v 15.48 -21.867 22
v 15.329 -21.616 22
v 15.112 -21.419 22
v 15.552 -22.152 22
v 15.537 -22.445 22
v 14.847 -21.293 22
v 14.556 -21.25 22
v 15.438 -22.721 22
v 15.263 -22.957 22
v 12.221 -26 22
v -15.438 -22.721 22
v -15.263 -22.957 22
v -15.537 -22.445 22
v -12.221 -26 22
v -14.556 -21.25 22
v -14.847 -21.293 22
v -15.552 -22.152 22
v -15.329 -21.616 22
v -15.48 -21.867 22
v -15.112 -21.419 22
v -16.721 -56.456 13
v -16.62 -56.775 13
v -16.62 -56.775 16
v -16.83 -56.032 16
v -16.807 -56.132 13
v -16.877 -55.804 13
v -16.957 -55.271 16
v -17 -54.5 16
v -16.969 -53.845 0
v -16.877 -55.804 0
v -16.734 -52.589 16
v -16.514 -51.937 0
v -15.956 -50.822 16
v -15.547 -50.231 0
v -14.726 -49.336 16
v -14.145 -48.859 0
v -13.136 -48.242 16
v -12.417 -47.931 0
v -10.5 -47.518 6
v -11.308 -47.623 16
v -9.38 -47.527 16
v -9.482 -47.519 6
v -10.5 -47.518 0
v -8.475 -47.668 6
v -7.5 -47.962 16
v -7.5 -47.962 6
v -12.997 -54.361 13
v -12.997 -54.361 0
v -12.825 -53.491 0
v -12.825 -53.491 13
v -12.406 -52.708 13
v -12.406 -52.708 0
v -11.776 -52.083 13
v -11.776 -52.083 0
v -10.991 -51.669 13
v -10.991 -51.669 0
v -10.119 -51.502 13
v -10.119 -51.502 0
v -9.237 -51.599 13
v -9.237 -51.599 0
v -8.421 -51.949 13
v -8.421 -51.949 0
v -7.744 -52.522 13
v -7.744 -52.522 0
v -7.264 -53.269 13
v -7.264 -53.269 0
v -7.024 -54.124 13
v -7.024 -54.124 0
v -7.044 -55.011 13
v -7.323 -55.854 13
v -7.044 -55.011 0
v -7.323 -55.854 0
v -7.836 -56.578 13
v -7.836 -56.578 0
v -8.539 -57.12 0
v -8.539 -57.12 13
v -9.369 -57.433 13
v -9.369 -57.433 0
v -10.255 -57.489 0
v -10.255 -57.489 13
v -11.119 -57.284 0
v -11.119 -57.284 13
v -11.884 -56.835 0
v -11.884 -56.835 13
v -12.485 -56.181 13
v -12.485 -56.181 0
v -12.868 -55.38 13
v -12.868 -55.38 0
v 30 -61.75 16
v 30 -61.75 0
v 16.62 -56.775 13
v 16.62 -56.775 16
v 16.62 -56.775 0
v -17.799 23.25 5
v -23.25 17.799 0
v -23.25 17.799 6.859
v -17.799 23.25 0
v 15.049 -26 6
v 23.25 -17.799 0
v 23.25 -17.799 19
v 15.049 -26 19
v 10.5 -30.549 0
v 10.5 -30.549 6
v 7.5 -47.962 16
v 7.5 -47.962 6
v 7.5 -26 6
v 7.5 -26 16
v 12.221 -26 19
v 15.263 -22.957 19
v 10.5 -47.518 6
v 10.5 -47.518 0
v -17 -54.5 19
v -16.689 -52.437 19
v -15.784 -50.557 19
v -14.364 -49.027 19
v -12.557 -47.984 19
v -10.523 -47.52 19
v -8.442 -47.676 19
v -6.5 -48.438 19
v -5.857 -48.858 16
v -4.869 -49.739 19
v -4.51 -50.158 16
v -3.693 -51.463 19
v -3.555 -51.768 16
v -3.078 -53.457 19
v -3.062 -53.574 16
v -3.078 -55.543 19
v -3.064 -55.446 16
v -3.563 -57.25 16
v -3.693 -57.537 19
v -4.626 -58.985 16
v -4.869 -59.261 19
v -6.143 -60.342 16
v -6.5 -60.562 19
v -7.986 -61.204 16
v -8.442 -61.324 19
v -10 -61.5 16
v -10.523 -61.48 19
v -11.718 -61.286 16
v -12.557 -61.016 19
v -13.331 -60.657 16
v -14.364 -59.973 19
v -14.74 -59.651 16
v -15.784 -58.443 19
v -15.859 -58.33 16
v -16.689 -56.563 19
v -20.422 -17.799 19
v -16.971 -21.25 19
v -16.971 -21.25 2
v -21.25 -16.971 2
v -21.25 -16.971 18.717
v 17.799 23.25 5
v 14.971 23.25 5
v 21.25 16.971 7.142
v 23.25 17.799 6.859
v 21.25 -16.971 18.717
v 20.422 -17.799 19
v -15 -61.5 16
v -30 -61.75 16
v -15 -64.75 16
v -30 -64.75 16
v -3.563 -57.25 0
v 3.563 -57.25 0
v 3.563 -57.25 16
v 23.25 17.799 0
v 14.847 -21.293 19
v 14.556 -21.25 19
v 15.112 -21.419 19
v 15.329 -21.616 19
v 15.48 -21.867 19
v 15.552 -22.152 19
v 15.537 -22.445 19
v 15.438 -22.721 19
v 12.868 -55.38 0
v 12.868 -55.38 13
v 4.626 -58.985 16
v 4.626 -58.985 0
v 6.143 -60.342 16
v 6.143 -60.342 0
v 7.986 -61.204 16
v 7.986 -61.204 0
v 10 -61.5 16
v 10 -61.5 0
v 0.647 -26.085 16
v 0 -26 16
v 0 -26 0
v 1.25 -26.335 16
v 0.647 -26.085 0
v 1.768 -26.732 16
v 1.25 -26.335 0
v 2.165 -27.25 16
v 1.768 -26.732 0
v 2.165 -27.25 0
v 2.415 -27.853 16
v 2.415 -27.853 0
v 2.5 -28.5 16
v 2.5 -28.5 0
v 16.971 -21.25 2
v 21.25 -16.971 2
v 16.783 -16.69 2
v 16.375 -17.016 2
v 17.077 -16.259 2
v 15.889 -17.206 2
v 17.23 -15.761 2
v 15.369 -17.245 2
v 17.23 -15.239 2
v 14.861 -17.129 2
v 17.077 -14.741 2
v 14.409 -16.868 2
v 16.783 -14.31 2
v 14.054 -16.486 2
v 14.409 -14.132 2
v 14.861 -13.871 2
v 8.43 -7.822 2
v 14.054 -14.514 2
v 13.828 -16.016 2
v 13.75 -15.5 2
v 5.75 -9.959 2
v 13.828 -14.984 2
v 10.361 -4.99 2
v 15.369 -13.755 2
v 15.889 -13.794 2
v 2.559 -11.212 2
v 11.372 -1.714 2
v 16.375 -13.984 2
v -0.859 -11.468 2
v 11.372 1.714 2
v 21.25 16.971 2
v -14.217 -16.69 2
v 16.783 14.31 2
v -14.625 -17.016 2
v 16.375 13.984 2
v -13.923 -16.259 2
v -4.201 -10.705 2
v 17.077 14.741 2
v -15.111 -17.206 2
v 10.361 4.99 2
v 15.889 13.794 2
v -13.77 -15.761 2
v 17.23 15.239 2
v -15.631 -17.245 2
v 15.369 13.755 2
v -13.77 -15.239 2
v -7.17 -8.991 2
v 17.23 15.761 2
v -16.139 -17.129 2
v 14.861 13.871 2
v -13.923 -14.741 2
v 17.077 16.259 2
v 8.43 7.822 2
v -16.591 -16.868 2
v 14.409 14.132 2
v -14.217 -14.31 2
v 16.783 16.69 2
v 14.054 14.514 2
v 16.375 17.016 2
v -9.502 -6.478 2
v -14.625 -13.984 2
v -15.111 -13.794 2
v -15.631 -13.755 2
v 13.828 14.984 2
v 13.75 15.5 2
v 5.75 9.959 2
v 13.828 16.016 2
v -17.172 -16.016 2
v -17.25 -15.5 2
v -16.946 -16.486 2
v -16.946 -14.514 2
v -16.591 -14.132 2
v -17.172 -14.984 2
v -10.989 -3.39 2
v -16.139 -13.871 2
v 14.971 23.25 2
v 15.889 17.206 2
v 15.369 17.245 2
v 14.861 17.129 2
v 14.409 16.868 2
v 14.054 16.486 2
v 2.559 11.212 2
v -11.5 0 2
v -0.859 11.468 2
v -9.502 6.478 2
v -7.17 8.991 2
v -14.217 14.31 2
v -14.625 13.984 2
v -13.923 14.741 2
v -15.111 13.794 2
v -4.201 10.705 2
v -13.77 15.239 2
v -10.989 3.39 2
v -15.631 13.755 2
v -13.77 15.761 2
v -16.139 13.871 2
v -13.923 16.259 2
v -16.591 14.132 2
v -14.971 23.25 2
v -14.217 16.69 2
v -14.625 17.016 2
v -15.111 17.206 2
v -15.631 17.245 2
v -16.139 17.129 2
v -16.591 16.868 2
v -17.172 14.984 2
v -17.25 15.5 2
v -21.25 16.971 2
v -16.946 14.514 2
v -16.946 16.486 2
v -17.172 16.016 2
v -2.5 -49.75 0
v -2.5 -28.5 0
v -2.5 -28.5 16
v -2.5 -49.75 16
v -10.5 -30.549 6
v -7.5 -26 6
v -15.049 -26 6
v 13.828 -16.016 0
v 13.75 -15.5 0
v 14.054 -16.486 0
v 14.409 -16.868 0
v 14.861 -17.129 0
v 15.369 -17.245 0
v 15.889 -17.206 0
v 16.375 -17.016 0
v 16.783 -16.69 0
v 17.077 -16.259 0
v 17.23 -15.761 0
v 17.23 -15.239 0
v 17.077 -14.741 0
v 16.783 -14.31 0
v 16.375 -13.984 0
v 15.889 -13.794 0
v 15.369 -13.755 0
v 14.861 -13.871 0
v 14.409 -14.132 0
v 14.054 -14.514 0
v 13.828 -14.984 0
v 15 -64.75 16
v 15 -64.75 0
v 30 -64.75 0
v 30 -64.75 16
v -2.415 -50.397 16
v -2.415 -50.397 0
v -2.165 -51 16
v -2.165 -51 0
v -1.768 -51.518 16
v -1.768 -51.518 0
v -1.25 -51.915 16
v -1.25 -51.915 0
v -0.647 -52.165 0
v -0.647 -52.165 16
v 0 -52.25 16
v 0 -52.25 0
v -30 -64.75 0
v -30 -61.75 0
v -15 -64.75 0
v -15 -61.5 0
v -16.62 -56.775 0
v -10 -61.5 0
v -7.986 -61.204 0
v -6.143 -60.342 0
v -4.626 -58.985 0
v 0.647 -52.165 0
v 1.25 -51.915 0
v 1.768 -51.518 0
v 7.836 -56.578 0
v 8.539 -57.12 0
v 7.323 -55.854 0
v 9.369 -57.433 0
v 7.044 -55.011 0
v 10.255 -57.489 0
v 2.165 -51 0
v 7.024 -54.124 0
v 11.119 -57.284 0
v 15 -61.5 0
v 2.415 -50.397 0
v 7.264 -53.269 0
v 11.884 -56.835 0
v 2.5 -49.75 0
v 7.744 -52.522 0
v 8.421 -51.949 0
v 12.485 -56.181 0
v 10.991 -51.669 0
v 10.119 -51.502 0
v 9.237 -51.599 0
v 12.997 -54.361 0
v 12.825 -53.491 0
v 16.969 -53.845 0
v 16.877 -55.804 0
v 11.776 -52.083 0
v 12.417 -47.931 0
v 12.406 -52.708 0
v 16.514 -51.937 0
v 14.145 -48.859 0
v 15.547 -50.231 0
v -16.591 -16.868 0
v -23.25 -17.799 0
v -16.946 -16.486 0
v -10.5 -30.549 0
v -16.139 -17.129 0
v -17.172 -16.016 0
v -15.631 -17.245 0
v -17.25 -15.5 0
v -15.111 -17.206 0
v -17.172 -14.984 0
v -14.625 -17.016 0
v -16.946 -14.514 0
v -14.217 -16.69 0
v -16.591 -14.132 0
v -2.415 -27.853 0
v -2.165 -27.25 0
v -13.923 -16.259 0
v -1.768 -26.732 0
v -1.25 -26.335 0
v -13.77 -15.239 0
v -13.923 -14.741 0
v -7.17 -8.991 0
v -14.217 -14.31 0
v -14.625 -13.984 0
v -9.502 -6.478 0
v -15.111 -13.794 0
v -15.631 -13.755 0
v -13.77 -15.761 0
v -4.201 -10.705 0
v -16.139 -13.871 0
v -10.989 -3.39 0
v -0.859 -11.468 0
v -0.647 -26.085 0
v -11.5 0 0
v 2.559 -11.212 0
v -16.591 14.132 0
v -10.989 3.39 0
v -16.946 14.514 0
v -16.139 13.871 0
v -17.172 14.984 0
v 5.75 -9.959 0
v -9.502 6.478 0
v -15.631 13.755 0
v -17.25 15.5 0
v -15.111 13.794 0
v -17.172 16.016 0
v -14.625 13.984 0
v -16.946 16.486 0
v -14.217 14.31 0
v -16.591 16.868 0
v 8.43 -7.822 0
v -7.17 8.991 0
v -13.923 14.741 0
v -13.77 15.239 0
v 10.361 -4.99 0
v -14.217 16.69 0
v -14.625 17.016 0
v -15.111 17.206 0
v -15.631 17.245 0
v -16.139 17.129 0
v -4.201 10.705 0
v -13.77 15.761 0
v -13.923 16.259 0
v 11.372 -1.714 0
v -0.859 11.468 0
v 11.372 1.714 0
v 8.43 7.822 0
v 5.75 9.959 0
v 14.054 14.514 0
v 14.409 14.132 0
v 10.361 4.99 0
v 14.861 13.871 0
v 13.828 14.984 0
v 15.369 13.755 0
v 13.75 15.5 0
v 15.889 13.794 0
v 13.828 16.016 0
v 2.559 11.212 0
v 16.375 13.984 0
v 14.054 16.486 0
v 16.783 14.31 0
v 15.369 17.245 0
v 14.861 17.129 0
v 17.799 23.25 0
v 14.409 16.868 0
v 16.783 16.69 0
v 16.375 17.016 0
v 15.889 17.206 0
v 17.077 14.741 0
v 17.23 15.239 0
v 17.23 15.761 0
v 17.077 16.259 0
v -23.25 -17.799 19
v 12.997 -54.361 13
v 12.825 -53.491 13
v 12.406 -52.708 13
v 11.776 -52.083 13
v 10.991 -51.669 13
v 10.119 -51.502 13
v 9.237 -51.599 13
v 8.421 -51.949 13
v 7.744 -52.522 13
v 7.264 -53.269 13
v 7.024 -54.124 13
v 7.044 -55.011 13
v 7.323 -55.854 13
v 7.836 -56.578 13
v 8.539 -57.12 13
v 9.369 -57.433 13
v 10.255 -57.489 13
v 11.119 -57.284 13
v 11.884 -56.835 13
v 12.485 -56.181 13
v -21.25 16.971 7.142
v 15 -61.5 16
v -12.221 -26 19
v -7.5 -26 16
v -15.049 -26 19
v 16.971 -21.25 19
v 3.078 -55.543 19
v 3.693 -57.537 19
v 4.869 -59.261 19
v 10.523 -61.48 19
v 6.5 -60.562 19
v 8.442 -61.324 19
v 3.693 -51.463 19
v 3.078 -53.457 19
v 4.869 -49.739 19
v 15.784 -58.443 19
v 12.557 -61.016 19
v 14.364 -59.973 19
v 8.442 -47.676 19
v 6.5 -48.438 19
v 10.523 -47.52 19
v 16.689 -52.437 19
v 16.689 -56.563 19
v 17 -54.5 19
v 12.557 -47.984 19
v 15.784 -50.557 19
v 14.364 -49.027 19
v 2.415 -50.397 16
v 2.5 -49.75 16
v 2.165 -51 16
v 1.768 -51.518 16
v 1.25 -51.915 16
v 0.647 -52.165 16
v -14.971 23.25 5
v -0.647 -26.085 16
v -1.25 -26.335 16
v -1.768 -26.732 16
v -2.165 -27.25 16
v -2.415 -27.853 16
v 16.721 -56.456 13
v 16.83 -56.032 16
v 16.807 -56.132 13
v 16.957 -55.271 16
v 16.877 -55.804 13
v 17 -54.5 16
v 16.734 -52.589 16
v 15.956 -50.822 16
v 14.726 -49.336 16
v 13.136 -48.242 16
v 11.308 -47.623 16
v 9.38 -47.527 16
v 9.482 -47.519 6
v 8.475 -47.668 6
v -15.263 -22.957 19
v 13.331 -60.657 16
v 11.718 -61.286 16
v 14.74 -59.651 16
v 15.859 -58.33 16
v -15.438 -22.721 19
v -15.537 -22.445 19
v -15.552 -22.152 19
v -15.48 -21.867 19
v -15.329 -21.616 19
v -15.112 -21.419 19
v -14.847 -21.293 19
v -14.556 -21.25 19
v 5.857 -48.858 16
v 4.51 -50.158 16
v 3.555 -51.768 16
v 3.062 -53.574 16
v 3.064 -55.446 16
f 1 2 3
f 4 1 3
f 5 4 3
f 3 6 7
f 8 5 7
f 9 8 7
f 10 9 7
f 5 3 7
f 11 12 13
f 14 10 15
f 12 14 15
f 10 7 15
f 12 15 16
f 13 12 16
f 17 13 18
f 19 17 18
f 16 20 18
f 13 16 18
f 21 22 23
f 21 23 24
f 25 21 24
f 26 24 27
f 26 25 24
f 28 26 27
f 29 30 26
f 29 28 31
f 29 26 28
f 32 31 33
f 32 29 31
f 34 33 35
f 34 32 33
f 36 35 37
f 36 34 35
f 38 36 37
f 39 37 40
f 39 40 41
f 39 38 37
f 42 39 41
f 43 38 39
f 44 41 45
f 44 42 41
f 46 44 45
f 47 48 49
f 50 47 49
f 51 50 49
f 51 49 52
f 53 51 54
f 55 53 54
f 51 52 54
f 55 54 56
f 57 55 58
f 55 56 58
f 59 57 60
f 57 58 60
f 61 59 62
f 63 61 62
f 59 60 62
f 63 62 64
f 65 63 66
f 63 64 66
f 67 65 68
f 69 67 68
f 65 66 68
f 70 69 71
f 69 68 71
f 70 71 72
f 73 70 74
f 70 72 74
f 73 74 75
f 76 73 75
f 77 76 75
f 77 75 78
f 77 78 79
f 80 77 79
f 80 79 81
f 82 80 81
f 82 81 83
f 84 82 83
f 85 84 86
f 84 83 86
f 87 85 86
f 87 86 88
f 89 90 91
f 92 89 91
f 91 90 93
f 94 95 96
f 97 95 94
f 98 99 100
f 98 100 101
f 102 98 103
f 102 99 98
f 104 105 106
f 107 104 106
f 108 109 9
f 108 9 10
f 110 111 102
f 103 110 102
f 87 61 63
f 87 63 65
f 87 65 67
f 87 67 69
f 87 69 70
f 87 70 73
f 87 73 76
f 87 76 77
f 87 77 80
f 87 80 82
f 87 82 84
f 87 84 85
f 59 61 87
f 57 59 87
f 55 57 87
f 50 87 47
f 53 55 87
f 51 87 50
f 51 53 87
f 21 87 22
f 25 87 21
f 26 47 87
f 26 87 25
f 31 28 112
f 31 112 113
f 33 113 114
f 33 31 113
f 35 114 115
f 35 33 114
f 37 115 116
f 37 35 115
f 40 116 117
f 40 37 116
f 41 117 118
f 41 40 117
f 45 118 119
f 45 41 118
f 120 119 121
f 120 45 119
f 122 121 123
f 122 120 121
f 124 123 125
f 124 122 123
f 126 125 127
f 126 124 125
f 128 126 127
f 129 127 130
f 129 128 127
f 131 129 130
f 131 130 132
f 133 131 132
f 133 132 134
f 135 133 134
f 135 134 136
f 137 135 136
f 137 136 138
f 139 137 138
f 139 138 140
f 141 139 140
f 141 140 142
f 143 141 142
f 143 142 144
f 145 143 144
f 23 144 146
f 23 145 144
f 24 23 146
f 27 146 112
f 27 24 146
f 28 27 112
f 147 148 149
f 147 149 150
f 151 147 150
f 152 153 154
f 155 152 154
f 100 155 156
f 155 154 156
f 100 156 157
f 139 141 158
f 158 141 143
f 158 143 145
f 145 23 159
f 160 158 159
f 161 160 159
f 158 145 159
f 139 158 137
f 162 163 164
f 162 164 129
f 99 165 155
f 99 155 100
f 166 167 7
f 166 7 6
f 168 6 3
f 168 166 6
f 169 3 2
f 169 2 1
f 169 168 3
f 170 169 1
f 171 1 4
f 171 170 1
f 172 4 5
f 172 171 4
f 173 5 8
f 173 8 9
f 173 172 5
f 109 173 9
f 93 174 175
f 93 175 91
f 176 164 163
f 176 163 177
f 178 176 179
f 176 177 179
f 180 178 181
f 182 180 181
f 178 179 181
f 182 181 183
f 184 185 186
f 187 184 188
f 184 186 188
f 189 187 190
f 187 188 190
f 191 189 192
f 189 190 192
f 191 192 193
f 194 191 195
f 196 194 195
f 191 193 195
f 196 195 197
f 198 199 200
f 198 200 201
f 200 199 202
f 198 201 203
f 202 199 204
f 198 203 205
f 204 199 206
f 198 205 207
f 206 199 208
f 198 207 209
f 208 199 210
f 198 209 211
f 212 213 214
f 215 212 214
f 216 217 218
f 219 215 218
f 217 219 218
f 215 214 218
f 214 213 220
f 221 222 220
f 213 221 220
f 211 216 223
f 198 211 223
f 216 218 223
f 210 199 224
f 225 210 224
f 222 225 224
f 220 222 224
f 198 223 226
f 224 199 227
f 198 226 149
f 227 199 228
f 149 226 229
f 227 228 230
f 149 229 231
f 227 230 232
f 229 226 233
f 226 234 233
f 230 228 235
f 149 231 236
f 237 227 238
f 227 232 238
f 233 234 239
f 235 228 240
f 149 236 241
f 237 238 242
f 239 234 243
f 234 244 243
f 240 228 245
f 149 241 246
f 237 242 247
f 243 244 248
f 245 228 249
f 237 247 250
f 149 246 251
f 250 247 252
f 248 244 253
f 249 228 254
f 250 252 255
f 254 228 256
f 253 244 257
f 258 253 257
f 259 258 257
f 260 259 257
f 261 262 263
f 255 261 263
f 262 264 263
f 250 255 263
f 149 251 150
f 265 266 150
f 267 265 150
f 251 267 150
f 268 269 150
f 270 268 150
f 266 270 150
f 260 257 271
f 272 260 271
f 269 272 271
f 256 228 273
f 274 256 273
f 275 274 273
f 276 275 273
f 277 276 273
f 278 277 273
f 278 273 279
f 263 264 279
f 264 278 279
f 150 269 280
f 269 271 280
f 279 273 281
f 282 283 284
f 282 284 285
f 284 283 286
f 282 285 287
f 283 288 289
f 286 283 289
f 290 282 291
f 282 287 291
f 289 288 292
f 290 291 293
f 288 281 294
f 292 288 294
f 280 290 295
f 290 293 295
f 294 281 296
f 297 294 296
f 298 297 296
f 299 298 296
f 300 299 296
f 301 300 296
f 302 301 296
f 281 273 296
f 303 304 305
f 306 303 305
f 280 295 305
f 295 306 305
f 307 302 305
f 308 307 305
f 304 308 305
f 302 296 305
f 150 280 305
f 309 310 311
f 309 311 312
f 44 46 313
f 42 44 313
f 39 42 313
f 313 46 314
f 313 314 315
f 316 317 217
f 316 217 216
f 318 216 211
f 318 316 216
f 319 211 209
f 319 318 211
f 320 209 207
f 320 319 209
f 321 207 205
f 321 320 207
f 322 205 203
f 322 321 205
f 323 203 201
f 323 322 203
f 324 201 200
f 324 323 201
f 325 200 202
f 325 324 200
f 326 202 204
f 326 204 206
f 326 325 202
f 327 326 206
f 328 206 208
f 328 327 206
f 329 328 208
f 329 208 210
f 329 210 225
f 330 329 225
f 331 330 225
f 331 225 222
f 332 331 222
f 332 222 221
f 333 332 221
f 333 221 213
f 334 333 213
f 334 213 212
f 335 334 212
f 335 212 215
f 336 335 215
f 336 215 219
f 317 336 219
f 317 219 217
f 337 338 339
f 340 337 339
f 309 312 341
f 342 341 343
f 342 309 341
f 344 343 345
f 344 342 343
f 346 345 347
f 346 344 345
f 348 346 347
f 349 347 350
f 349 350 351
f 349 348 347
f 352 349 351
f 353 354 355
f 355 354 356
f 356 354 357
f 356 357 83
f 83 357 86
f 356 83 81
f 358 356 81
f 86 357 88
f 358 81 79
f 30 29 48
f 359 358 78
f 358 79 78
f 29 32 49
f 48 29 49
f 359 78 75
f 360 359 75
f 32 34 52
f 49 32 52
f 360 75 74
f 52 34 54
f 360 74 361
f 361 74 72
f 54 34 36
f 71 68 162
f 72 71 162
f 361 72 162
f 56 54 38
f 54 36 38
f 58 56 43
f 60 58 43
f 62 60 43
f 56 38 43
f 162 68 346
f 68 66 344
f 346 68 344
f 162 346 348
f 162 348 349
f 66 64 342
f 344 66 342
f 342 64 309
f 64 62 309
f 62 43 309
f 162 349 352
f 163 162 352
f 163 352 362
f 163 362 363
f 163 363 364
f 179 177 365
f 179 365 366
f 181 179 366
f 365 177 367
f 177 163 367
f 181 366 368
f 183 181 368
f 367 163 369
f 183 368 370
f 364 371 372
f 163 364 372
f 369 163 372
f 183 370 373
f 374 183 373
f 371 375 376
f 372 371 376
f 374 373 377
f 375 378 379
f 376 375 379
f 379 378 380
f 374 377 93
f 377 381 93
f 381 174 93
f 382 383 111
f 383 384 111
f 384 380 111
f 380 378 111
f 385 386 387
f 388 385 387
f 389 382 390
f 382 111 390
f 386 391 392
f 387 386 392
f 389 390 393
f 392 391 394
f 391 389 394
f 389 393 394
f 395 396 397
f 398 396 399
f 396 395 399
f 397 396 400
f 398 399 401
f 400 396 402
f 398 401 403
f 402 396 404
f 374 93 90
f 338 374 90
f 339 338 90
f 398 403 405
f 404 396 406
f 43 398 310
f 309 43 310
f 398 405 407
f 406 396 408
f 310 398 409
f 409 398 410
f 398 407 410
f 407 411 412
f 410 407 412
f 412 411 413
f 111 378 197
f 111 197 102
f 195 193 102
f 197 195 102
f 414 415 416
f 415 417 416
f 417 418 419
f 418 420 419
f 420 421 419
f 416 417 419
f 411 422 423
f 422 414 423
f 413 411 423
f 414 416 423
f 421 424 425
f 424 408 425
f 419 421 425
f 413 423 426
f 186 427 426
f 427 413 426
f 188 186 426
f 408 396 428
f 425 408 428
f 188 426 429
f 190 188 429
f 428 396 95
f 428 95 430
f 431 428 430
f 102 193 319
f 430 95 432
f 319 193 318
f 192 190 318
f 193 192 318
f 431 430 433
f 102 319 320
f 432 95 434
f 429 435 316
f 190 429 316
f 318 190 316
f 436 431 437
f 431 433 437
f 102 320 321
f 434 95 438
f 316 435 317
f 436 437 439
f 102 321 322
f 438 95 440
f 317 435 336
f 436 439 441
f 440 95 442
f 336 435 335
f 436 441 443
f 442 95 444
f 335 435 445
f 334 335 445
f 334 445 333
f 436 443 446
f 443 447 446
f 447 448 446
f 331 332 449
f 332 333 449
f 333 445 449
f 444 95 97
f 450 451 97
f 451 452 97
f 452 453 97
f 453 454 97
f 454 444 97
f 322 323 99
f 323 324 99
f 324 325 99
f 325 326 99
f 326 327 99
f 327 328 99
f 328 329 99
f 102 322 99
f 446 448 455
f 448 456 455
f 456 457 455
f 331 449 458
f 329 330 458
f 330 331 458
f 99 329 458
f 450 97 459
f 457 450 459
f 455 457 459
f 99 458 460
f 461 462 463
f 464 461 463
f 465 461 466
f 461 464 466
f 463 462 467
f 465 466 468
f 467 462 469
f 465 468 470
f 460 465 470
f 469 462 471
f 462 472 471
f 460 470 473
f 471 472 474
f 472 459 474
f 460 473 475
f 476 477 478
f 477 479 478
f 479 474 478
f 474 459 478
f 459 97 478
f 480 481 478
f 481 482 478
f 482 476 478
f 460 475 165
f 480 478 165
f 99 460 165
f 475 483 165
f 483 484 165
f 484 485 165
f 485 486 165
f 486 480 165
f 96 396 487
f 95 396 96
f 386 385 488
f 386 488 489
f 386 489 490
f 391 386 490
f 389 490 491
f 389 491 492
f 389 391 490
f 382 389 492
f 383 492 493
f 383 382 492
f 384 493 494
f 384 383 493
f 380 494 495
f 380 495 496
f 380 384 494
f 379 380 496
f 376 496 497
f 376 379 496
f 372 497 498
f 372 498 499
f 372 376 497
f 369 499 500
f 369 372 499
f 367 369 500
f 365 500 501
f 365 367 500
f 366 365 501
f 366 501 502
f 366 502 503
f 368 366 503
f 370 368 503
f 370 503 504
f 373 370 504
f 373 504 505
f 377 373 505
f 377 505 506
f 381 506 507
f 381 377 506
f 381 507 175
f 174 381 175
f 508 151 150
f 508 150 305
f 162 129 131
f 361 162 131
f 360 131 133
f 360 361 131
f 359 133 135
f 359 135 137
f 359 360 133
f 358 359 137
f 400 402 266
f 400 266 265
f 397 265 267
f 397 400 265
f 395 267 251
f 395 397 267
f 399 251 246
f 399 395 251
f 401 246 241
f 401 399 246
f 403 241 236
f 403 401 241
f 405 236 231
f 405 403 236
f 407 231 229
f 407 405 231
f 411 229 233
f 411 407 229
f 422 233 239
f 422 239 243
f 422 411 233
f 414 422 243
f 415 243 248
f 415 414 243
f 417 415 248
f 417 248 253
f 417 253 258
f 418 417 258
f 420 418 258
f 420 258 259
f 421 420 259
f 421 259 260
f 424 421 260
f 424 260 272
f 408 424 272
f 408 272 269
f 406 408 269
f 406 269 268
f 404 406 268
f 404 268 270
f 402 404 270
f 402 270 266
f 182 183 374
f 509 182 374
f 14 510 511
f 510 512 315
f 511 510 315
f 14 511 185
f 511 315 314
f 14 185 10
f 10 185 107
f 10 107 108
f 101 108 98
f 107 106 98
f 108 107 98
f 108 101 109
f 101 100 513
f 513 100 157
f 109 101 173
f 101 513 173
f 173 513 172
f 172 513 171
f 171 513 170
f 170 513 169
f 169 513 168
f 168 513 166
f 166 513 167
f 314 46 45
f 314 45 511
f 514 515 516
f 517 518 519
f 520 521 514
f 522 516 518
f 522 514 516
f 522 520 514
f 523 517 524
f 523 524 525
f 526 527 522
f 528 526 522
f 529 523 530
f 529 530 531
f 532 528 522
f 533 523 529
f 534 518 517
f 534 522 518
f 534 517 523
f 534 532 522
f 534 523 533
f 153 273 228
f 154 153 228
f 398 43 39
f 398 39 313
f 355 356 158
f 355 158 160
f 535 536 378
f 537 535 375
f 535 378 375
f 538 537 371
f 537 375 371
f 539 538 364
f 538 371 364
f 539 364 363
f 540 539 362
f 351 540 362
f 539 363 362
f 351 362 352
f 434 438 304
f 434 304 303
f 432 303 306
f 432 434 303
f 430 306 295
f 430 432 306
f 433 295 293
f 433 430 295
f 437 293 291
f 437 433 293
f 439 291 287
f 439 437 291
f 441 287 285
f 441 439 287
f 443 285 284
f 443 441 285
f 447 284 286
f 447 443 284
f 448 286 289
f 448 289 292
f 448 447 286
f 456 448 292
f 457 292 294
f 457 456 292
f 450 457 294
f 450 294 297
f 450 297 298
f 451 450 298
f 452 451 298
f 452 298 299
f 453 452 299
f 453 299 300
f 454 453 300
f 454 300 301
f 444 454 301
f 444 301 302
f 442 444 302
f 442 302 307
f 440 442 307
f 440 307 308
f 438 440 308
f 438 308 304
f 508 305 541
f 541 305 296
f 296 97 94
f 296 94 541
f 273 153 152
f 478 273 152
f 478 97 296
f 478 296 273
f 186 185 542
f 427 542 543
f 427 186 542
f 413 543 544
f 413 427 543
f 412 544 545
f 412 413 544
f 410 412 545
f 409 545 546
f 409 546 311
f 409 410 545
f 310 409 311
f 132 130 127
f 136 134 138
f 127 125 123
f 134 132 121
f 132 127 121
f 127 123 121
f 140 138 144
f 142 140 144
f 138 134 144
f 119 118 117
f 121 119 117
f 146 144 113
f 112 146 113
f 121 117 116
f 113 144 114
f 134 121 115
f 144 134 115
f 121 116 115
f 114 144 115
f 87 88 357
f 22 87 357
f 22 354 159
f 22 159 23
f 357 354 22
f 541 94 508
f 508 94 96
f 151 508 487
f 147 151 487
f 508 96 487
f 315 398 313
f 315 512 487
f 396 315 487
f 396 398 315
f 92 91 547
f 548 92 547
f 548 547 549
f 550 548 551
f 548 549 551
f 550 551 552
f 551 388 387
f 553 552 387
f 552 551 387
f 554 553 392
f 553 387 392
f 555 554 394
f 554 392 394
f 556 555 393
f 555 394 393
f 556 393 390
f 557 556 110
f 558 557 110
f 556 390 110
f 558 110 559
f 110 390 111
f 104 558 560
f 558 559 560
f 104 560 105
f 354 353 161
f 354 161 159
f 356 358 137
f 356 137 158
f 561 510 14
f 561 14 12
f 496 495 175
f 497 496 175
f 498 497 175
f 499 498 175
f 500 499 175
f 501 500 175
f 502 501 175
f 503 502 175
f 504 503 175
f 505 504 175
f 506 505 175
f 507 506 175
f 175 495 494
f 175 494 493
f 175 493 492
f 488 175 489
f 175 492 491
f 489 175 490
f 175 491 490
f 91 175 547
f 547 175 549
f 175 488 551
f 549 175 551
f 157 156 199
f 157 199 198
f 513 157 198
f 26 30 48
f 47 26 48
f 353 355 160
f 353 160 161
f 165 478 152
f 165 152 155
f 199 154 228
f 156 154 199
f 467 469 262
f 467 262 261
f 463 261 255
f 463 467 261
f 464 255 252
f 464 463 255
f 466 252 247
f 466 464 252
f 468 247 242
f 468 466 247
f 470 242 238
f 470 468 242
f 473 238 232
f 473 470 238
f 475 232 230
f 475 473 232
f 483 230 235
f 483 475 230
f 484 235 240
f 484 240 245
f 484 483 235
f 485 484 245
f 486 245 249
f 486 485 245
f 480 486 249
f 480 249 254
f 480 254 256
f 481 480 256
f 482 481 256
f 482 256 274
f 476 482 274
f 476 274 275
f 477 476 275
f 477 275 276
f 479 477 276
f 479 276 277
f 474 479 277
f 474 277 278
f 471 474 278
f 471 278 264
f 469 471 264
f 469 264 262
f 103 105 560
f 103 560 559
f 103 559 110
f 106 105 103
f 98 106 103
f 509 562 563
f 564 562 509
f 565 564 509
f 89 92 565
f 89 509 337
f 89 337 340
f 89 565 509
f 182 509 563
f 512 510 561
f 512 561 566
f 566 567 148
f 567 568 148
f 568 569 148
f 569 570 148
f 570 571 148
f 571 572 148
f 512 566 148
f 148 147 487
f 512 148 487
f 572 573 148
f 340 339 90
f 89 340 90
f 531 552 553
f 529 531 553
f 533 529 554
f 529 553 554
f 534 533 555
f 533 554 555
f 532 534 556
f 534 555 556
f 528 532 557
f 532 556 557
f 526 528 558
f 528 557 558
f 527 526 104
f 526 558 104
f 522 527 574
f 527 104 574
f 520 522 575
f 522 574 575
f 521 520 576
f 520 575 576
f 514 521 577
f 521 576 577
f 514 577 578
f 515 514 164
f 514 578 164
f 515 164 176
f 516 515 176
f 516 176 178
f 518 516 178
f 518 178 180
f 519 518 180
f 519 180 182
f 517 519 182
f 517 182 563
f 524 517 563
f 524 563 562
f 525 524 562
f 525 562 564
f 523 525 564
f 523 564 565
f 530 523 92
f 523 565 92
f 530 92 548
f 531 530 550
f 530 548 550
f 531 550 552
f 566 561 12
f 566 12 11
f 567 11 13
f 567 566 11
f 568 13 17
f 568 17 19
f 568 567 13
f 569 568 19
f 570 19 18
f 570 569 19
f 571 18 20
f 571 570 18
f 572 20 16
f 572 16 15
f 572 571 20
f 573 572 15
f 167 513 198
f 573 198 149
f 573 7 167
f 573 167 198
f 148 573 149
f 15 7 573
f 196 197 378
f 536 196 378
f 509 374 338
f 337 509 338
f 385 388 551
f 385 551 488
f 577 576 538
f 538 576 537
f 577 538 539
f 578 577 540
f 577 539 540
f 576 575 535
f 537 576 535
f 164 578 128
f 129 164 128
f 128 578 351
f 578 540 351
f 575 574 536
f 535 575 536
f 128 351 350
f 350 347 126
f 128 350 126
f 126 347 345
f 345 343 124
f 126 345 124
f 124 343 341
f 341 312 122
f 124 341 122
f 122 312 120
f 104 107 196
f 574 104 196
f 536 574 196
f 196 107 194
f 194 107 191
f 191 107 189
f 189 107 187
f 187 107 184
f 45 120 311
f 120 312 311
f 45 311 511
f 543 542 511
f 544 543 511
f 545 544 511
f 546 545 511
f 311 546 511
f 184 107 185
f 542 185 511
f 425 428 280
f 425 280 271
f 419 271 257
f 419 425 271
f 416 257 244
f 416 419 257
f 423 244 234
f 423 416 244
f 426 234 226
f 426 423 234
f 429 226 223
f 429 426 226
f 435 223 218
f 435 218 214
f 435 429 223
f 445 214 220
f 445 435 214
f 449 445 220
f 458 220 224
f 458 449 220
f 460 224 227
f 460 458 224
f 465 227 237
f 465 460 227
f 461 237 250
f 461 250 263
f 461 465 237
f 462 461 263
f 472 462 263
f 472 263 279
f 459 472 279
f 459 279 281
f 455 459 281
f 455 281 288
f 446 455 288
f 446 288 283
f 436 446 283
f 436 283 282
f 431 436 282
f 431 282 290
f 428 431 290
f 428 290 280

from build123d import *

# Parameters (mm, degrees)
SKETCH3_R               = 11.5
SKETCH3_R_2             = 1.75
BOSS_EXTRUDE1_DEPTH     = 19
CUT_EXTRUDE1_START      = 19
SKETCH3_3_R             = 11.5
SKETCH3_3_R_2           = 1.75
CUT_EXTRUDE1_DEPTH      = 17
SKETCH3_4_R             = 1.75
SKETCH3_4_R_2           = 11.5
CUT_EXTRUDE3_DEPTH      = 38.975320933
CUT_EXTRUDE7_DEPTH      = 38.975320933
CUT_EXTRUDE7_DEPTH_BACK = 38.975320933
CUT_EXTRUDE8_DEPTH      = 38.015199581
BOSS_EXTRUDE4_DEPTH     = 19
BOSS_EXTRUDE5_START     = 19
BOSS_EXTRUDE5_DEPTH     = 3
BOSS_EXTRUDE6_DEPTH     = 6
BOSS_EXTRUDE7_START     = -6
BOSS_EXTRUDE7_DEPTH     = 16
SKETCH14_R              = 7
BOSS_EXTRUDE8_DEPTH     = 3
SKETCH15_R              = 3
CUT_EXTRUDE10_DEPTH     = 13


# Read off the part's stored shape, not the designer's step: Boss-Extrude7
with BuildPart() as part:
    # Sketch3 → Boss-Extrude1 (new body)
    # profile 1 of 7: a face of its own
    with BuildSketch(Plane.XY):
        Polygon((-23.25, 17.798989873), (-17.798989873, 23.25), (17.798989873, 23.25), (23.25, 17.798989873), (23.25, -17.798989873), (17.798989873, -23.25), (-17.798989873, -23.25), (-23.25, -17.798989873), align=None)
        Polygon((21.25, 16.970562748), (16.970562748, 21.25), (-16.970562748, 21.25), (-21.25, 16.970562748), (-21.25, -16.970562748), (-16.970562748, -21.25), (16.970562748, -21.25), (21.25, -16.970562748), align=None, mode=Mode.SUBTRACT)
    # profile 2 of 7: a face of its own
    with BuildSketch(Plane.XY):
        Polygon((21.25, 16.970562748), (21.25, -16.970562748), (16.970562748, -21.25), (-16.970562748, -21.25), (-21.25, -16.970562748), (-21.25, 16.970562748), (-16.970562748, 21.25), (16.970562748, 21.25), align=None)
        Circle(SKETCH3_R, mode=Mode.SUBTRACT)
        with Locations((-15.5, -15.5)):
            Circle(SKETCH3_R_2, mode=Mode.SUBTRACT)
        with Locations((15.5, -15.5)):
            Circle(SKETCH3_R_2, mode=Mode.SUBTRACT)
        with Locations((15.5, 15.5)):
            Circle(SKETCH3_R_2, mode=Mode.SUBTRACT)
        with Locations((-15.5, 15.5)):
            Circle(SKETCH3_R_2, mode=Mode.SUBTRACT)
    # profile 3 of 7: a face of its own
    with BuildSketch(Plane.XY):
        with Locations((-15.5, 15.5)):
            Circle(SKETCH3_R_2)
    # profile 4 of 7: a face of its own
    with BuildSketch(Plane.XY):
        with Locations((15.5, 15.5)):
            Circle(SKETCH3_R_2)
    # profile 5 of 7: a face of its own
    with BuildSketch(Plane.XY):
        with Locations((15.5, -15.5)):
            Circle(SKETCH3_R_2)
    # profile 6 of 7: a face of its own
    with BuildSketch(Plane.XY):
        with Locations((-15.5, -15.5)):
            Circle(SKETCH3_R_2)
    # profile 7 of 7: a face of its own
    with BuildSketch(Plane.XY):
        Circle(SKETCH3_R)
    extrude(amount=BOSS_EXTRUDE1_DEPTH)

    # Sketch3<3> → Cut-Extrude1 (cut)
    with BuildSketch(Plane.XY.offset(CUT_EXTRUDE1_START)):
        Polygon((21.25, 16.970562748), (21.25, -16.970562748), (16.970562748, -21.25), (-16.970562748, -21.25), (-21.25, -16.970562748), (-21.25, 16.970562748), (-16.970562748, 21.25), (16.970562748, 21.25), align=None)
        Circle(SKETCH3_3_R, mode=Mode.SUBTRACT)
        with Locations((-15.5, -15.5)):
            Circle(SKETCH3_3_R_2, mode=Mode.SUBTRACT)
        with Locations((15.5, -15.5)):
            Circle(SKETCH3_3_R_2, mode=Mode.SUBTRACT)
        with Locations((15.5, 15.5)):
            Circle(SKETCH3_3_R_2, mode=Mode.SUBTRACT)
        with Locations((-15.5, 15.5)):
            Circle(SKETCH3_3_R_2, mode=Mode.SUBTRACT)
    extrude(amount=-CUT_EXTRUDE1_DEPTH, mode=Mode.SUBTRACT)

    # Sketch3<4> → Cut-Extrude3 (cut, through all)
    with BuildSketch(Plane.XY):
        with Locations(Location((-15.5, 15.5, 0), (0, 0, 180))):
            Circle(SKETCH3_4_R)
        with Locations(Location((15.5, 15.5, 0), (0, 0, 180))):
            Circle(SKETCH3_4_R)
        with Locations(Location((-15.5, -15.5, 0), (0, 0, 180))):
            Circle(SKETCH3_4_R)
        with Locations(Location((0, 0, 0), (0, 0, 180))):
            Circle(SKETCH3_4_R_2)
        with Locations(Location((15.5, -15.5, 0), (0, 0, 180))):
            Circle(SKETCH3_4_R)
    extrude(amount=CUT_EXTRUDE3_DEPTH, mode=Mode.SUBTRACT)

    # Sketch6 → Cut-Extrude7 (cut, two sides: drawn at the far end of the back side and taken through both)
    with BuildSketch(Plane(origin=(0, 0, 0), x_dir=(0, 0, -1), z_dir=(1, 0, 0)).offset(-CUT_EXTRUDE7_DEPTH_BACK)):
        Polygon((-19, 23.25), (-5, 23.25), (-19, -17.798989873), align=None)
    extrude(amount=CUT_EXTRUDE7_DEPTH + CUT_EXTRUDE7_DEPTH_BACK, mode=Mode.SUBTRACT)

    # Sketch8 → Cut-Extrude8 (cut, through all)
    with BuildSketch(Plane.XY.offset(2)):
        Polygon((-16.970562748, 21.25), (-14.970562748, 23.25), (14.970562748, 23.25), (16.970562748, 21.25), align=None)
    extrude(amount=CUT_EXTRUDE8_DEPTH, mode=Mode.SUBTRACT)

    # Sketch10 → Boss-Extrude4 (add)
    with BuildSketch(Plane.XY):
        Polygon((19.798989873, -21.25), (-19.798989873, -21.25), (-15.048989873, -26), (15.048989873, -26), align=None)
    extrude(amount=BOSS_EXTRUDE4_DEPTH)

    # Sketch11 → Boss-Extrude5 (add)
    with BuildSketch(Plane.XY.offset(BOSS_EXTRUDE5_START)):
        with BuildLine():
            Line((-14.556349186, -21.25), (14.556349186, -21.25))
            ThreePointArc((14.556349186, -21.25), (15.480228719, -21.867316568), (15.263455967, -22.957106781))
            Line((15.263455967, -22.957106781), (12.220562748, -26))
            Line((12.220562748, -26), (-12.220562748, -26))
            Line((-12.220562748, -26), (-15.263455967, -22.957106781))
            ThreePointArc((-15.263455967, -22.957106781), (-15.480228719, -21.867316568), (-14.556349186, -21.25))
        make_face()
    extrude(amount=BOSS_EXTRUDE5_DEPTH)


with BuildPart() as body_2:
    # Sketch12 → Boss-Extrude6 (new body)
    with BuildSketch(Plane.XY):
        with BuildLine():
            Line((2.5, -28.5), (2.5, -49.75))
            ThreePointArc((2.5, -49.75), (1.767766953, -51.517766953), (0, -52.25))
            Line((0, -52.25), (0, -57.25))
            Line((0, -57.25), (10.5, -57.25))
            Line((10.5, -57.25), (10.5, -30.548989873))
            Line((10.5, -30.548989873), (15.048989873, -26))
            Line((15.048989873, -26), (0, -26))
            ThreePointArc((0, -26), (1.767766953, -26.732233047), (2.5, -28.5))
        make_face()
    extrude(amount=BOSS_EXTRUDE6_DEPTH)

    # Boss-Extrude7 outline → Boss-Extrude7 (add)
    with BuildSketch(Plane.XY.offset(6).offset(BOSS_EXTRUDE7_START)):
        with BuildLine():
            Line((7.5, -26), (0, -26))
            ThreePointArc((0, -26), (1.767766953, -26.732233047), (2.5, -28.5))
            Line((2.5, -28.5), (2.5, -49.75))
            ThreePointArc((2.5, -49.75), (1.767766953, -51.517766953), (0, -52.25))
            Line((0, -52.25), (0, -57.25))
            Line((0, -57.25), (3.562803405, -57.25))
            ThreePointArc((3.562803405, -57.25), (6.143187845, -60.341660723), (10, -61.5))
            Line((10, -61.5), (15, -61.5))
            Line((15, -61.5), (15, -64.75))
            Line((15, -64.75), (30, -64.75))
            Line((30, -64.75), (30, -61.75))
            Line((30, -61.75), (16.619881116, -56.775340415))
            ThreePointArc((16.619881116, -56.775340415), (14.864528014, -49.466475668), (7.5, -47.961651585))
            Line((7.5, -47.961651585), (7.5, -26))
        make_face()
    extrude(amount=BOSS_EXTRUDE7_DEPTH)

    # Sketch14 → Boss-Extrude8 (add)
    with BuildSketch(Plane.XY.offset(16)):
        with Locations((10, -54.5)):
            Circle(SKETCH14_R)
    extrude(amount=BOSS_EXTRUDE8_DEPTH)

    # Sketch15 → Cut-Extrude10 (cut)
    with BuildSketch(Plane.XY):
        with Locations((10, -54.5)):
            Circle(SKETCH15_R)
        with BuildLine():
            Line((16.866218411, -56.866927358), (17.214706637, -55.9296142))
            Line((17.214706637, -55.9296142), (12.996797424, -54.361417185))
            ThreePointArc((12.996797424, -54.361417185), (12.999199249, -54.430690092), (13, -54.5))
            ThreePointArc((13, -54.5), (12.966794868, -54.94511595), (12.867914527, -55.380378478))
            Line((12.867914527, -55.380378478), (16.866218411, -56.866927358))
        make_face()
    extrude(amount=CUT_EXTRUDE10_DEPTH, mode=Mode.SUBTRACT)


with BuildPart() as body_3:
    # Mirror1: mirrored copy
    add(body_2.part.mirror(Plane(origin=(0, 0, 0), x_dir=(0, 0, 1), z_dir=(1, 0, 0))))


with BuildPart() as body_2_1:
    add(body_2.part)

    # Combine1: union body 3, part
    add(body_3.part)
    add(part.part)


solid = body_2_1.part
